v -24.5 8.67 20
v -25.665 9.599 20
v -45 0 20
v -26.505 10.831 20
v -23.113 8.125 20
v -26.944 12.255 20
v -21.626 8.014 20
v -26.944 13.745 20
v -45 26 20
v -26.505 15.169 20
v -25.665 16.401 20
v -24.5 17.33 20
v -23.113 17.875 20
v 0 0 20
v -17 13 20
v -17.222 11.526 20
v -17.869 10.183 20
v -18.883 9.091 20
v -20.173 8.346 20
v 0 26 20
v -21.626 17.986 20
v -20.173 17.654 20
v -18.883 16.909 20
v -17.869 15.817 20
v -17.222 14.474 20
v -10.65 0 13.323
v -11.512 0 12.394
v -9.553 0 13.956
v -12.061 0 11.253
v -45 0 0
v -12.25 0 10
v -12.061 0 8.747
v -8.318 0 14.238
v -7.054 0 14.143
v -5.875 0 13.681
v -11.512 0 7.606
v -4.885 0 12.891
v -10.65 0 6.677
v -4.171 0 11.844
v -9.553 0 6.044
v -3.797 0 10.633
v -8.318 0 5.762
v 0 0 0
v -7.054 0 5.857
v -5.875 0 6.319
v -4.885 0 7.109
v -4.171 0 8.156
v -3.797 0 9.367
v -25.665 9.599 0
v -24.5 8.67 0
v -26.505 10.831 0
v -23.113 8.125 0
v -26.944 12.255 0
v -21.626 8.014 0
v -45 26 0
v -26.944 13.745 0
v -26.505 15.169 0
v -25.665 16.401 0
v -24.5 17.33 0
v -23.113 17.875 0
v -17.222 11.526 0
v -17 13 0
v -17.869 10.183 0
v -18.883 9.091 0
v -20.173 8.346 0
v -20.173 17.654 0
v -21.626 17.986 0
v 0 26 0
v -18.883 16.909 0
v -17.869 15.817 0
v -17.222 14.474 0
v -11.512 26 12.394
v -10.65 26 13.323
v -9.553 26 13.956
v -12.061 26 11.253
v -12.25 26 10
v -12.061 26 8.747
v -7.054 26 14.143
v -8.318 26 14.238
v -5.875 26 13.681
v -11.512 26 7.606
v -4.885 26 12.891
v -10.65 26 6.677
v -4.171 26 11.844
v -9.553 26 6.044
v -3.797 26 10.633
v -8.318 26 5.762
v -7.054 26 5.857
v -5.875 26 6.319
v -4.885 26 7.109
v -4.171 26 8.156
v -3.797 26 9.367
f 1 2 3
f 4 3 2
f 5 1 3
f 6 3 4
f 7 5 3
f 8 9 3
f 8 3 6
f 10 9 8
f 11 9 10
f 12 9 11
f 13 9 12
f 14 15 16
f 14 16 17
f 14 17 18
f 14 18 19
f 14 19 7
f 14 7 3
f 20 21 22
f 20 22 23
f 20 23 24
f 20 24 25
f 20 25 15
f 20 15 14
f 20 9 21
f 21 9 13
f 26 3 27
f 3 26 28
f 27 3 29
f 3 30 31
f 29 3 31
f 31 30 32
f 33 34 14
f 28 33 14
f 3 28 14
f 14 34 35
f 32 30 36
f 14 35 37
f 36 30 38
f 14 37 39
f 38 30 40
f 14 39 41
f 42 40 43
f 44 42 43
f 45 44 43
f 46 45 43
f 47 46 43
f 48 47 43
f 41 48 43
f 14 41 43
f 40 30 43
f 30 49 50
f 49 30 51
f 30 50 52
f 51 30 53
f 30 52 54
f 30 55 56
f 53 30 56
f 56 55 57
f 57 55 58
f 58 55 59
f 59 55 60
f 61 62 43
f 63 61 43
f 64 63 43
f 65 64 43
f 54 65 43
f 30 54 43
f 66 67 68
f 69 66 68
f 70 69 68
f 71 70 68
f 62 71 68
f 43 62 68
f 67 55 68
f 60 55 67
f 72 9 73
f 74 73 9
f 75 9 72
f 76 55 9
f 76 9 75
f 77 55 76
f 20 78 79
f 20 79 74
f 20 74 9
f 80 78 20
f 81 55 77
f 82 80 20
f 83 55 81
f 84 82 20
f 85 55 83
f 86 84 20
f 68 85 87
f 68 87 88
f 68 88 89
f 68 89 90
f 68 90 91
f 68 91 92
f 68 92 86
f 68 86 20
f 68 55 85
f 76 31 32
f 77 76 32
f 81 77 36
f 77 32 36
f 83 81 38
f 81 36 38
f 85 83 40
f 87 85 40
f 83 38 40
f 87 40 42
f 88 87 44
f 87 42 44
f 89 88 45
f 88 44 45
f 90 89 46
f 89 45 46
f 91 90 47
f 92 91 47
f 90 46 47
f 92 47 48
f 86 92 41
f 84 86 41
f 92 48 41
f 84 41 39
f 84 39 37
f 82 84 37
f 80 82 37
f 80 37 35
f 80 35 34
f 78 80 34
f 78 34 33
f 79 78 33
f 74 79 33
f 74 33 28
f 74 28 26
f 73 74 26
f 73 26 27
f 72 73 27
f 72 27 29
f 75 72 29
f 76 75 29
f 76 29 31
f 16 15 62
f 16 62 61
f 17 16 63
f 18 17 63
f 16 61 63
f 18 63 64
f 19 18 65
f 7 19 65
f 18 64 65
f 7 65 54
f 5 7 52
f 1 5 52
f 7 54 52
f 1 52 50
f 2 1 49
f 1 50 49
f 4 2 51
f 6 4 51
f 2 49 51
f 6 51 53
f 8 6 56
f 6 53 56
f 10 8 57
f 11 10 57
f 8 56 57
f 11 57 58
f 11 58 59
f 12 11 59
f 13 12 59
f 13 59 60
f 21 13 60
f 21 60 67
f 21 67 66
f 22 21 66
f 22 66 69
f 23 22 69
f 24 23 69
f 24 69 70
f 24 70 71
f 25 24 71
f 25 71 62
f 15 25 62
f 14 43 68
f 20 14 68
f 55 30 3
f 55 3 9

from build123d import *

# Parameters (mm, degrees)
ESQUISSE1_W                         = 45
ESQUISSE1_H                         = 26
BOSS_EXTRU_1_DEPTH                  = 20
ENL_V_MAT_EXTRU_1_REACH             = 22
ESQUISSE3_R                         = 5
ENL_V_MAT_EXTRU_1_DIRECTION_2_DEPTH = 1
TROU_TARAUD_M101_D                  = 8.5
TROU_TARAUD_M101_DEPTH              = 26


with BuildPart() as part:
    # Esquisse1 → Boss.-Extru.1 (new body)
    with BuildSketch(Plane.XY):
        with Locations((-22.5, 13)):
            Rectangle(ESQUISSE1_W, ESQUISSE1_H)
    extrude(amount=BOSS_EXTRU_1_DEPTH)

    # Esquisse3 → Enlèv. mat.-Extru.1 (cut, up to next)
    with BuildSketch(Plane(origin=(0, 0, 0), x_dir=(-1, 0, 0), z_dir=(0, 0, -1)), mode=Mode.PRIVATE) as enl_v_mat_extru_1_sk1:
        with Locations(Location((22, 13, 0), (0, 0, 180))):  # turned: the seam where the file's is
            Circle(ESQUISSE3_R)
    enl_v_mat_extru_1_tool1 = extrude(enl_v_mat_extru_1_sk1.sketch, amount=-ENL_V_MAT_EXTRU_1_REACH, mode=Mode.PRIVATE) & part.part
    add(enl_v_mat_extru_1_tool1.solids().sort_by_distance((-22, 13, 0))[0], mode=Mode.SUBTRACT)

    # Esquisse3 → Enlèv. mat.-Extru.1 direction 2 (cut)
    with BuildSketch(Plane(origin=(0, 0, 0), x_dir=(-1, 0, 0), z_dir=(0, 0, -1))):
        with Locations(Location((22, 13, 0), (0, 0, 180))):  # turned: the seam where the file's is
            Circle(ESQUISSE3_R)
    extrude(amount=ENL_V_MAT_EXTRU_1_DIRECTION_2_DEPTH, mode=Mode.SUBTRACT)

    # Trou taraudé M101
    with Locations(Plane(origin=(0, 26, 0), x_dir=(1, 0, 0), z_dir=(0, 1, 0))):
        with Locations((-8, -10)):
            Hole(TROU_TARAUD_M101_D / 2, depth=TROU_TARAUD_M101_DEPTH)


solid = part.part
